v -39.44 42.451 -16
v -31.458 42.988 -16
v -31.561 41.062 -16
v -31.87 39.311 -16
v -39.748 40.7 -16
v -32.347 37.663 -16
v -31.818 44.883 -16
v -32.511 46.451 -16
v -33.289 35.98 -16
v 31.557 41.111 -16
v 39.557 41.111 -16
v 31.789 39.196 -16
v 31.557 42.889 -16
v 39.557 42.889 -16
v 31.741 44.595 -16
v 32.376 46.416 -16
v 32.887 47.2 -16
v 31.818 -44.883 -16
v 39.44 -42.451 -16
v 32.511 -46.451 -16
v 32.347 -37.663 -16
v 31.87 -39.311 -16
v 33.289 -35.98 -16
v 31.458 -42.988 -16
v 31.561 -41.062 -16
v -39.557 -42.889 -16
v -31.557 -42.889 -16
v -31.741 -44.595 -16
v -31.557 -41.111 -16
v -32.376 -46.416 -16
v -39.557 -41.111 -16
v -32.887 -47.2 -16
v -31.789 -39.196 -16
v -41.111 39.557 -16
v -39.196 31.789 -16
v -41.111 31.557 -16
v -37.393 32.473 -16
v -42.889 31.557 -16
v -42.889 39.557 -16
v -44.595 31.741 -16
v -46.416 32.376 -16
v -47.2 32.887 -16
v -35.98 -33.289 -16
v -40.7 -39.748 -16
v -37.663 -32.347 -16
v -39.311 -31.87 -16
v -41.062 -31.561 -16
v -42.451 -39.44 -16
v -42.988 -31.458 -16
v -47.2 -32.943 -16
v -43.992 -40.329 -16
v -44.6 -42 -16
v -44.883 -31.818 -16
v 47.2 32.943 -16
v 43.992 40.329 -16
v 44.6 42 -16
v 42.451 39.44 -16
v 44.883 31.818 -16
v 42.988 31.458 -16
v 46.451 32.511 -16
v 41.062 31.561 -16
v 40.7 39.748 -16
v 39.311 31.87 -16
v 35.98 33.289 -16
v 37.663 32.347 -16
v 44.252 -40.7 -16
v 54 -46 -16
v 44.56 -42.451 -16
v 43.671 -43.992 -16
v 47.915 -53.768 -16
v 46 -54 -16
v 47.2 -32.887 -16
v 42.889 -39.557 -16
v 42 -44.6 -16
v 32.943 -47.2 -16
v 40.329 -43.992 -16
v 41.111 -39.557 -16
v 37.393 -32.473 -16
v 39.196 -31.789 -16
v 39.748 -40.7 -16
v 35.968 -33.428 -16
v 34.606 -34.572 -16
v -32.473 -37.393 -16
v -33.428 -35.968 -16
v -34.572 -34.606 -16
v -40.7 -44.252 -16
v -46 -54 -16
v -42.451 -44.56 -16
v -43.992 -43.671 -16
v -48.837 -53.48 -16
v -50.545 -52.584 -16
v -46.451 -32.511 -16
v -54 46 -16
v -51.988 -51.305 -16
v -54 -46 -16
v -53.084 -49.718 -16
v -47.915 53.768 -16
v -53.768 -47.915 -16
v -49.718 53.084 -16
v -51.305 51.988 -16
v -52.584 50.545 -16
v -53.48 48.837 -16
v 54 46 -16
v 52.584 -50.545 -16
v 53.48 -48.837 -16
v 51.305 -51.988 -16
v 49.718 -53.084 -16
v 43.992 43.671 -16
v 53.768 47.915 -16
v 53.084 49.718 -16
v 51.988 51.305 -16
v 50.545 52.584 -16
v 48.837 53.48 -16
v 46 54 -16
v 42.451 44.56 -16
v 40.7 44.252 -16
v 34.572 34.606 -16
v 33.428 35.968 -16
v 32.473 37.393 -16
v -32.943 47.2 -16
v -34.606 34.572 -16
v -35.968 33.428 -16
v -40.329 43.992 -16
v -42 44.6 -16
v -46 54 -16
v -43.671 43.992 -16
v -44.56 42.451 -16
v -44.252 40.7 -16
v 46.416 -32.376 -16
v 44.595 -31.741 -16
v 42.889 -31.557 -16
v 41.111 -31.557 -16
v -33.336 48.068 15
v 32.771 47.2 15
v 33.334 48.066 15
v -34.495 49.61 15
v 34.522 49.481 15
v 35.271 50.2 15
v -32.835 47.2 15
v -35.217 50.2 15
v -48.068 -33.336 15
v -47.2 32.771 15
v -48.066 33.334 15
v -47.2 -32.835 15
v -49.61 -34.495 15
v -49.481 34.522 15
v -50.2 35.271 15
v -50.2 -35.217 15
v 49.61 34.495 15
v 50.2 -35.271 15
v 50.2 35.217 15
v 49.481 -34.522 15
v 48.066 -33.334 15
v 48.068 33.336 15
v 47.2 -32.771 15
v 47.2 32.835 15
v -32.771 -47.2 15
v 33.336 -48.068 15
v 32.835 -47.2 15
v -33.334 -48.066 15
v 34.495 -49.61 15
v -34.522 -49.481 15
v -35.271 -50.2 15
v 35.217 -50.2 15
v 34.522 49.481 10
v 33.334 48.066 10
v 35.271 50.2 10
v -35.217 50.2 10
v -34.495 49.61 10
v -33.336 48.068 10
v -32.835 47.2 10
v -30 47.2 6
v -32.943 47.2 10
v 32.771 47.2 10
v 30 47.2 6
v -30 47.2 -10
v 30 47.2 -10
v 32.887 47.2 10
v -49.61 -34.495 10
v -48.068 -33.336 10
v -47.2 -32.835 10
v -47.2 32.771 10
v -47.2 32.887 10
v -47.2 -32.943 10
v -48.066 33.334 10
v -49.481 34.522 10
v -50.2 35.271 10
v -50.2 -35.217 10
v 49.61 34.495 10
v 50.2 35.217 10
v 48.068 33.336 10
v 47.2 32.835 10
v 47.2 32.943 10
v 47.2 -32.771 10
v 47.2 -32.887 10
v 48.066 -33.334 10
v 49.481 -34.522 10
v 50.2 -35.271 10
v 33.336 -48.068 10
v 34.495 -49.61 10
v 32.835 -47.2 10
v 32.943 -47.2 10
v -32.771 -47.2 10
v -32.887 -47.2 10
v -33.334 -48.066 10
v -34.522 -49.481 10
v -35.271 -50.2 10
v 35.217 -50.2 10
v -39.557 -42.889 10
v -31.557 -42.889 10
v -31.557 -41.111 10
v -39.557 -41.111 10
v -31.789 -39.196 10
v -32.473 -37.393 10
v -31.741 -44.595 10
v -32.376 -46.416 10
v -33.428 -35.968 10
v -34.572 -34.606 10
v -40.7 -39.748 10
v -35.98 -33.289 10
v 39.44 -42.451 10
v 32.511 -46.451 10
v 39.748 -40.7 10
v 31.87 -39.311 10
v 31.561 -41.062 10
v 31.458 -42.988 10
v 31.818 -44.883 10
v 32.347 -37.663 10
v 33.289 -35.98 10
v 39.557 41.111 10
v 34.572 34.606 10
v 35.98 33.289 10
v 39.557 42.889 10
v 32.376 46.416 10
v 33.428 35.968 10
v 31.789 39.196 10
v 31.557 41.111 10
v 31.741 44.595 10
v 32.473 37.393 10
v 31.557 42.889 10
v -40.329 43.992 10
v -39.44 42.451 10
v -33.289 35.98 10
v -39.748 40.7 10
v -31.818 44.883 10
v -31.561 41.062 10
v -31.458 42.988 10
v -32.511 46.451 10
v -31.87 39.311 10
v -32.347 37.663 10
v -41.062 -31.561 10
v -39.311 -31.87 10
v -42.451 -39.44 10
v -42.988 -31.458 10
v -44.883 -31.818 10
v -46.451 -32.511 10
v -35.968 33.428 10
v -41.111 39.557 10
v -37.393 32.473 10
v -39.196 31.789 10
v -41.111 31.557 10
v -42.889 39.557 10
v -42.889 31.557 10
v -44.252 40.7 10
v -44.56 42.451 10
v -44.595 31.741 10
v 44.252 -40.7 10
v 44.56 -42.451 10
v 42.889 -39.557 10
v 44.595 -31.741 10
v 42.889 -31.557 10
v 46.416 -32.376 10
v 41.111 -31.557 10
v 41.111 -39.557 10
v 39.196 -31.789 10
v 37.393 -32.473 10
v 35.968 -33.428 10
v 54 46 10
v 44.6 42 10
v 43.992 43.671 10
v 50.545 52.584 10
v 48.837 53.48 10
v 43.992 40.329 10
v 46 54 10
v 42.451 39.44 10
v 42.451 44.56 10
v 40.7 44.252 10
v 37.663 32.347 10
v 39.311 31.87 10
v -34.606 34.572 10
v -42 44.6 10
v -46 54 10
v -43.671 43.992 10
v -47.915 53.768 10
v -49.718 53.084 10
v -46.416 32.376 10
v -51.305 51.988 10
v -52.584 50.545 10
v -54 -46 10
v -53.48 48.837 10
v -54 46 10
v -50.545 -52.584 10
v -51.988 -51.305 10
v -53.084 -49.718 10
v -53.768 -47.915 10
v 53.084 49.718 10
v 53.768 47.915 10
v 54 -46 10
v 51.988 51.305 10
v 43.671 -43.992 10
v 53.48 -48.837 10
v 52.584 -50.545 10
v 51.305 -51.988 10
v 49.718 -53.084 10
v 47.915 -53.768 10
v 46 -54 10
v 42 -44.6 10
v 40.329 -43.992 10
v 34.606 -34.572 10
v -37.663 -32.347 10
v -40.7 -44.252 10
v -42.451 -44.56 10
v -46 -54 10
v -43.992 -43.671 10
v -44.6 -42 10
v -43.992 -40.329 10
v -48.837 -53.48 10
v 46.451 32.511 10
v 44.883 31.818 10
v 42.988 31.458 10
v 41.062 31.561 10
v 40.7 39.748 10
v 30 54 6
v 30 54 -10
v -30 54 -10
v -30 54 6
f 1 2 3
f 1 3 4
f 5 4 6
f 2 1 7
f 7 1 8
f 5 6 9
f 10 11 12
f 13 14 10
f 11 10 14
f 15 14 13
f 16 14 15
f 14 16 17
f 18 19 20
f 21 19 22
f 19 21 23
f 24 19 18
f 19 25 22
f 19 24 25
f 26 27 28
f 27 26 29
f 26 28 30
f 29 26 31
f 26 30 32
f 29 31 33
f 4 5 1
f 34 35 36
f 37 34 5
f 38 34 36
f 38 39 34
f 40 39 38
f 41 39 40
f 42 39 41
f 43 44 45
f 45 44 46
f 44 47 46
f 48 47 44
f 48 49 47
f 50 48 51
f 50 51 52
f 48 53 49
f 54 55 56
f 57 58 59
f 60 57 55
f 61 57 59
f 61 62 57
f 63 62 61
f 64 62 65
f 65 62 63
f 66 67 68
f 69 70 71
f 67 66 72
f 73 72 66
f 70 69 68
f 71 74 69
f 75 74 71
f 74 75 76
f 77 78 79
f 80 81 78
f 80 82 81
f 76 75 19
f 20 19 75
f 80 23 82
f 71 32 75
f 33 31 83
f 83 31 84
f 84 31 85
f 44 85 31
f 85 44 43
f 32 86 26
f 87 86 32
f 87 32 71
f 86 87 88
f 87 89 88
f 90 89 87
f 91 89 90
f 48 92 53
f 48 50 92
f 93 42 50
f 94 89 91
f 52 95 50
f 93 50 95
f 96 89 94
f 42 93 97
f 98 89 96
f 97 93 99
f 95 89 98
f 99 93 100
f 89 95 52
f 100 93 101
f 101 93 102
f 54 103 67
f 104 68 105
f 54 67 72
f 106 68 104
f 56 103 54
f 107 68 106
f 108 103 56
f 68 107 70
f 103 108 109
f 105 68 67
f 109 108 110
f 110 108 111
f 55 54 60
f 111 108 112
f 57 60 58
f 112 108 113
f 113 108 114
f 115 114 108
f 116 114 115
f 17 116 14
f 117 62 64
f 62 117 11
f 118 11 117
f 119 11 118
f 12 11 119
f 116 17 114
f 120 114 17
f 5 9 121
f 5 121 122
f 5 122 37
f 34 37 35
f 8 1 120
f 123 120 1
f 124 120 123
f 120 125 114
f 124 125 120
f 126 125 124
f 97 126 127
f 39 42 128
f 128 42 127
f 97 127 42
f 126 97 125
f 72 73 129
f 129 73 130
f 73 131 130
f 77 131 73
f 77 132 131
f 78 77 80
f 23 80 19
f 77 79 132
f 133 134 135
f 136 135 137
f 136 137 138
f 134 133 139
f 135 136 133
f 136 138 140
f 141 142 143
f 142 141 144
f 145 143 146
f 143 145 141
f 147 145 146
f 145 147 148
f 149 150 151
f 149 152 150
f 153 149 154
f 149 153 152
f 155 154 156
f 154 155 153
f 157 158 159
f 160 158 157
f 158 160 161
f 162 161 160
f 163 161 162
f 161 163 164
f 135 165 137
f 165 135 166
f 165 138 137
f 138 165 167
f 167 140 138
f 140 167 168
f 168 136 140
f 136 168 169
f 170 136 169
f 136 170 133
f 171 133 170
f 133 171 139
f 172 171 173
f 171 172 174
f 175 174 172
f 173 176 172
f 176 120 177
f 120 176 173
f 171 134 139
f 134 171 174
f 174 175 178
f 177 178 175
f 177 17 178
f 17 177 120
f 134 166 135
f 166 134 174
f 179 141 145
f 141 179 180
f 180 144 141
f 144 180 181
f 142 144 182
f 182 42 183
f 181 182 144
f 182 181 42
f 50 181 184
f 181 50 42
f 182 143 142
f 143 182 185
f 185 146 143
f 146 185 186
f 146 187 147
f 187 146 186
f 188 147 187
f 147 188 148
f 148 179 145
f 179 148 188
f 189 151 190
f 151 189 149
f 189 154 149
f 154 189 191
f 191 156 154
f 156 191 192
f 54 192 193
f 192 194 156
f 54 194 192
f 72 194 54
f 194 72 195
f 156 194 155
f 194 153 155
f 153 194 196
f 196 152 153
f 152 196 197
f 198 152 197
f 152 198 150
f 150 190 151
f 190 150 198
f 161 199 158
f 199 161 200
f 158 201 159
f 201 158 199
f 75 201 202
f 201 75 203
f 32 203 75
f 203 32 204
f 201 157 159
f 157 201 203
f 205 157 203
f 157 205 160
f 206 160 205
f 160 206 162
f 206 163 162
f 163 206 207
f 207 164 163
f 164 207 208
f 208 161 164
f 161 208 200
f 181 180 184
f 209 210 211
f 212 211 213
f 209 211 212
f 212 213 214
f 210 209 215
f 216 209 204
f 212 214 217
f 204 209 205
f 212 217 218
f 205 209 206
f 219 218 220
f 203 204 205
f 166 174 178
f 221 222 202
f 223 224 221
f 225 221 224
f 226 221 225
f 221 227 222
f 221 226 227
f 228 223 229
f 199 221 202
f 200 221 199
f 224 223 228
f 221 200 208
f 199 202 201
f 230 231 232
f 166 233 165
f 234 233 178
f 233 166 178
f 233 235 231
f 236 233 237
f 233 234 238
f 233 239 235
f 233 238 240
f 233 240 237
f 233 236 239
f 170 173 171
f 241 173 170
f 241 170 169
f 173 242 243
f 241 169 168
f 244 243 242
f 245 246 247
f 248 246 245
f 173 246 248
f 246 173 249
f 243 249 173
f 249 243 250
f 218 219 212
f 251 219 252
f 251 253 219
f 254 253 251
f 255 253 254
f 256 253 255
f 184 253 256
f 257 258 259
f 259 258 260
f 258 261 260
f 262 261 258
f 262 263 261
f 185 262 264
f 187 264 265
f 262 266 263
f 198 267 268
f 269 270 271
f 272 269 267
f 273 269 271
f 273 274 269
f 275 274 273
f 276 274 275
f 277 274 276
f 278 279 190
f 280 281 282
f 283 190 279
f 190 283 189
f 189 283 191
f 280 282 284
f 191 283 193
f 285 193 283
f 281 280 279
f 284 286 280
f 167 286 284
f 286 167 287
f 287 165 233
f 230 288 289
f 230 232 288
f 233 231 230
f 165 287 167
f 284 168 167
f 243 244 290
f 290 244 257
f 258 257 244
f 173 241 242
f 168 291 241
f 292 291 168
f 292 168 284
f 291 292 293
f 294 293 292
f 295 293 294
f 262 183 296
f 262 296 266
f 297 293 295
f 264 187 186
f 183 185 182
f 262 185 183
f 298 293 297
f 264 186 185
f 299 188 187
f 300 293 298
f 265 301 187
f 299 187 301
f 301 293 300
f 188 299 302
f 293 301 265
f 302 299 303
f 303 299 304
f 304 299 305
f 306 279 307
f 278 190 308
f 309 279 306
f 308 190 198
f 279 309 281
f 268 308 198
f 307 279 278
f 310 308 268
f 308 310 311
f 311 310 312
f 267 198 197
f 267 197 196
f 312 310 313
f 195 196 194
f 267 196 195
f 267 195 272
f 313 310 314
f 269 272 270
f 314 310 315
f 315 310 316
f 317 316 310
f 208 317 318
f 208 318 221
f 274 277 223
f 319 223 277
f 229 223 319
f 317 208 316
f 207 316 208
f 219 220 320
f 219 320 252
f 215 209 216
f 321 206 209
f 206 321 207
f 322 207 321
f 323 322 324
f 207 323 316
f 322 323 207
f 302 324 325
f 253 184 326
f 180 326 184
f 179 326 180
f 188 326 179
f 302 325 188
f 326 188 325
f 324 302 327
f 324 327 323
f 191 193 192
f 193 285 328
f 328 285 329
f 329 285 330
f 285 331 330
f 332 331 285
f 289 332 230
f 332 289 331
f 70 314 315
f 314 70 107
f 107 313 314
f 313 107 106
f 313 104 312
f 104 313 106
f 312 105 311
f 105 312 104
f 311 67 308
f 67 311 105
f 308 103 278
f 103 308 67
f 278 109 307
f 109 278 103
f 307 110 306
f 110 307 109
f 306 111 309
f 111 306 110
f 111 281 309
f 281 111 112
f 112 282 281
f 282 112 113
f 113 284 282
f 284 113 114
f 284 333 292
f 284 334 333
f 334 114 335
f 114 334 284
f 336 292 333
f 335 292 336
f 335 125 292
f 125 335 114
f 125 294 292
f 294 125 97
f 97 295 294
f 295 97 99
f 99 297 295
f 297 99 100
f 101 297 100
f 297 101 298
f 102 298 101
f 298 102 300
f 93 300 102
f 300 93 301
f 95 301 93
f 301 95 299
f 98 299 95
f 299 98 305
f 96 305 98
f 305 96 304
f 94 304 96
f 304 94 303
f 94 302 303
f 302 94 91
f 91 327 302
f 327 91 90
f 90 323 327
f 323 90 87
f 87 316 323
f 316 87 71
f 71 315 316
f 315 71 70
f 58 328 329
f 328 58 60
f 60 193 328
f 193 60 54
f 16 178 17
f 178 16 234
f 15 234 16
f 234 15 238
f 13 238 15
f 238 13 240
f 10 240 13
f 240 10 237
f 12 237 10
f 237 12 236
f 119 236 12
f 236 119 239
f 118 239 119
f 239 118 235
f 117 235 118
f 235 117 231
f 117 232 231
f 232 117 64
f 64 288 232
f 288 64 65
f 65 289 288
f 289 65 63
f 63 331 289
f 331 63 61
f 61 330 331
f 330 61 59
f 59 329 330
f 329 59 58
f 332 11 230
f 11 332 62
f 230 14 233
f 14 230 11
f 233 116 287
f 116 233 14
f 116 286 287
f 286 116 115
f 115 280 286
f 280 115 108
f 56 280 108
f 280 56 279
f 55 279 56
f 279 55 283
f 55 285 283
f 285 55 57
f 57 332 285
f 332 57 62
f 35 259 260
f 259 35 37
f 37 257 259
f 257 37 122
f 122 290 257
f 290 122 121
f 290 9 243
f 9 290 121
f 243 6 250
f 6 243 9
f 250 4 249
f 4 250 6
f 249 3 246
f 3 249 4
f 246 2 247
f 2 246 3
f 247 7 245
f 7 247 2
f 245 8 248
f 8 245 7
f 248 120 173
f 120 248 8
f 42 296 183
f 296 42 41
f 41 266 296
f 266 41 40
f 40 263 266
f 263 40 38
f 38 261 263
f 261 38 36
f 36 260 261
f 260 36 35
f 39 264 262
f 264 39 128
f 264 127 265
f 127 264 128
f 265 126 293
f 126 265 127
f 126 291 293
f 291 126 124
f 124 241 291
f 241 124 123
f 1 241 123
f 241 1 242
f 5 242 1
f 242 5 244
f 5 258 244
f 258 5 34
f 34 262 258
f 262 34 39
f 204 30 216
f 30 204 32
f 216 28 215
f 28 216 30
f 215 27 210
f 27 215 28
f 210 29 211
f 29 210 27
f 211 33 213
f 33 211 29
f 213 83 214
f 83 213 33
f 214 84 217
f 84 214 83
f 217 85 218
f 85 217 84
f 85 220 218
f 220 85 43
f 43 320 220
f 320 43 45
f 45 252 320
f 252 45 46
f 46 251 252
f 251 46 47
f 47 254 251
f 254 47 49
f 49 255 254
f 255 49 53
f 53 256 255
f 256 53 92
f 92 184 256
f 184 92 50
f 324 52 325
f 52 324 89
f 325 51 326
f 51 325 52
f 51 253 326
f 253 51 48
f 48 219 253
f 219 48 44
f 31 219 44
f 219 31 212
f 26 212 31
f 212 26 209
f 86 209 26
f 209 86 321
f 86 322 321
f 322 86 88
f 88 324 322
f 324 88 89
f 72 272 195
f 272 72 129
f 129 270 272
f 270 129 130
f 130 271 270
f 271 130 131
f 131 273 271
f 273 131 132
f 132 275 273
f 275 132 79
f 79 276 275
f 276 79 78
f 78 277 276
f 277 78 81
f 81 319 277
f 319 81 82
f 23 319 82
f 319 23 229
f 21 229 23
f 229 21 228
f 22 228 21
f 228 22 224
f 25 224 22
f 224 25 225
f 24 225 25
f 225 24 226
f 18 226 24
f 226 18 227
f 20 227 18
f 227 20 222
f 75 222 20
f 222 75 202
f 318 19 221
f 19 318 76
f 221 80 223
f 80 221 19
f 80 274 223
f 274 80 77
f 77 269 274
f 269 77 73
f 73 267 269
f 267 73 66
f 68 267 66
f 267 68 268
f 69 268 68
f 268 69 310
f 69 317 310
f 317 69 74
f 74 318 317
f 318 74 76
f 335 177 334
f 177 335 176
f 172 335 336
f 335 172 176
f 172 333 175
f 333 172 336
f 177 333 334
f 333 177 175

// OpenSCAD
bearing_inner_diameter=50;
bearing_outer_diameter=65;
ring_offset=1;
bearing_height=7;
inter_ring_depth=0.2;

motor_total_height = 38;

wall_thickness = 8;
top_thickness = 3.5;
print_offset = 0.2;

electronics_height=26;

box_outer=100;

a=78.5;
b=43;
c=38;


//%translate([0,0,motor_total_height+wall_thickness-2]) bearing();
%translate([0,0,30]) base_box();
translate([0,0,-20]) weight_box();
!# translate([0,0,10]) control_box();

module control_box(){
    
    difference(){
    translate([0,0,-electronics_height]){

    
        linear_extrude(electronics_height+5){
difference(){            

 offset(print_offset) offset(wall_thickness) square(box_outer-2*wall_thickness,center=true);
               offset(print_offset) offset(wall_thickness-3) square(box_outer-2*wall_thickness,center=true);
for(i=[0:90:360]) rotate(i) translate([box_outer/2-wall_thickness,box_outer/2-wall_thickness])  
                   offset(wall_thickness) circle(d=5+print_offset*2);
            }
        }
        
        linear_extrude(electronics_height){
            difference(){
               offset(wall_thickness) square(box_outer-wall_thickness,center=true);
               offset(print_offset) offset(wall_thickness-3) square(box_outer-2*wall_thickness,center=true);
            }
        }
        
        
        
        linear_extrude(electronics_height){
               for(i=[0:90:360]) rotate(i) translate([box_outer/2-wall_thickness,box_outer/2-wall_thickness])         difference(){
                   offset(wall_thickness) circle(d=5+print_offset);  
     circle(d=5+print_offset);  
                   
            }
        }    
    }
    
    translate([0,box_outer/2,-electronics_height+6]){
    linear_extrude(electronics_height-10) square([box_outer-5*wall_thickness,box_outer],center=true);
}
}
}

module weight_box(){
    translate([0,0,-motor_total_height]){

        linear_extrude(motor_total_height+4){
            difference(){
                offset(wall_thickness-3) square(box_outer-2*wall_thickness,center=true);
               offset(print_offset) offset(wall_thickness-6) square(box_outer-2*wall_thickness,center=true);
               for(i=[0:90:360]) rotate(i) translate([box_outer/2-wall_thickness,box_outer/2-wall_thickness])  
                   offset(wall_thickness) circle(d=5+print_offset*2);                 
            }
        }

        
        linear_extrude(motor_total_height){
            difference(){
               offset(wall_thickness) square(box_outer-wall_thickness,center=true);
               offset(print_offset) offset(wall_thickness-3) square(box_outer-2*wall_thickness,center=true);
            }
        }
        
        translate([0,0,-top_thickness])
        linear_extrude(top_thickness){
            difference(){
                offset(wall_thickness) square(box_outer-wall_thickness,center=true);
                for(i=[0:90:360]) rotate(i) translate([box_outer/2-wall_thickness,box_outer/2-wall_thickness]) circle(d=5+print_offset);                
            }
        }
        
        
        linear_extrude(motor_total_height){
               for(i=[0:90:360]) rotate(i) translate([box_outer/2-wall_thickness,box_outer/2-wall_thickness])         difference(){
                   offset(wall_thickness) circle(d=5+print_offset);  
     circle(d=5+print_offset);  
                   
            }
        }    
    }
}

module base_box($fn=180){    
    translate([0,0,15]) linear_extrude(motor_total_height-15){
        difference(){
           offset(wall_thickness) circle(d=a);
           offset(print_offset) circle(d=a);
        }
    }  

    linear_extrude(15){
        difference(){
           offset(wall_thickness) circle(d=a);
           offset(print_offset) circle(d=a);
           translate([-(wall_thickness+a)/2,0]) square(18,center=true);
        }
    }    
    
    linear_extrude(motor_total_height){
        difference(){
           offset(wall_thickness) square(box_outer-wall_thickness,center=true);
           offset(print_offset) offset(wall_thickness) square(box_outer-2*wall_thickness,center=true);
        }
    }
    
    translate([0,0,motor_total_height])
    linear_extrude(top_thickness+bearing_height/2+1){
        difference(){
            offset(wall_thickness) square(box_outer-wall_thickness,center=true);
            offset(print_offset) circle(d=b);
            for(i=[0:40:360]) rotate(i) translate([73/2,0]) circle(d=3+print_offset);
            for(i=[0:90:360]) rotate(i) translate([box_outer/2-wall_thickness,box_outer/2-wall_thickness]) circle(d=5+print_offset);                
        }
    }
    
    
    linear_extrude(motor_total_height){
           for(i=[0:90:360]) rotate(i) translate([box_outer/2-wall_thickness,box_outer/2-wall_thickness])         difference(){
               offset(wall_thickness) circle(d=5+print_offset);  
 circle(d=5+print_offset);  
               
        }
    }    
}

module bearing($fn=180){
    translate([0,0,bearing_height/2]){
        linear_extrude(bearing_height,center=true) {
            // outer ring
            difference(){
                circle(d=bearing_outer_diameter);
                offset(-ring_offset) circle(d=bearing_outer_diameter);
            }
            // inner ring
            difference(){
                offset(ring_offset) circle(d=bearing_inner_diameter);
                circle(d=bearing_inner_diameter);
            }
        }
        //inter ring
        linear_extrude(bearing_height-2*inter_ring_depth,center=true) {
            difference(){
                circle(d=bearing_outer_diameter-ring_offset);
                circle(d=bearing_inner_diameter+ring_offset);
            }
        }
    }

}
